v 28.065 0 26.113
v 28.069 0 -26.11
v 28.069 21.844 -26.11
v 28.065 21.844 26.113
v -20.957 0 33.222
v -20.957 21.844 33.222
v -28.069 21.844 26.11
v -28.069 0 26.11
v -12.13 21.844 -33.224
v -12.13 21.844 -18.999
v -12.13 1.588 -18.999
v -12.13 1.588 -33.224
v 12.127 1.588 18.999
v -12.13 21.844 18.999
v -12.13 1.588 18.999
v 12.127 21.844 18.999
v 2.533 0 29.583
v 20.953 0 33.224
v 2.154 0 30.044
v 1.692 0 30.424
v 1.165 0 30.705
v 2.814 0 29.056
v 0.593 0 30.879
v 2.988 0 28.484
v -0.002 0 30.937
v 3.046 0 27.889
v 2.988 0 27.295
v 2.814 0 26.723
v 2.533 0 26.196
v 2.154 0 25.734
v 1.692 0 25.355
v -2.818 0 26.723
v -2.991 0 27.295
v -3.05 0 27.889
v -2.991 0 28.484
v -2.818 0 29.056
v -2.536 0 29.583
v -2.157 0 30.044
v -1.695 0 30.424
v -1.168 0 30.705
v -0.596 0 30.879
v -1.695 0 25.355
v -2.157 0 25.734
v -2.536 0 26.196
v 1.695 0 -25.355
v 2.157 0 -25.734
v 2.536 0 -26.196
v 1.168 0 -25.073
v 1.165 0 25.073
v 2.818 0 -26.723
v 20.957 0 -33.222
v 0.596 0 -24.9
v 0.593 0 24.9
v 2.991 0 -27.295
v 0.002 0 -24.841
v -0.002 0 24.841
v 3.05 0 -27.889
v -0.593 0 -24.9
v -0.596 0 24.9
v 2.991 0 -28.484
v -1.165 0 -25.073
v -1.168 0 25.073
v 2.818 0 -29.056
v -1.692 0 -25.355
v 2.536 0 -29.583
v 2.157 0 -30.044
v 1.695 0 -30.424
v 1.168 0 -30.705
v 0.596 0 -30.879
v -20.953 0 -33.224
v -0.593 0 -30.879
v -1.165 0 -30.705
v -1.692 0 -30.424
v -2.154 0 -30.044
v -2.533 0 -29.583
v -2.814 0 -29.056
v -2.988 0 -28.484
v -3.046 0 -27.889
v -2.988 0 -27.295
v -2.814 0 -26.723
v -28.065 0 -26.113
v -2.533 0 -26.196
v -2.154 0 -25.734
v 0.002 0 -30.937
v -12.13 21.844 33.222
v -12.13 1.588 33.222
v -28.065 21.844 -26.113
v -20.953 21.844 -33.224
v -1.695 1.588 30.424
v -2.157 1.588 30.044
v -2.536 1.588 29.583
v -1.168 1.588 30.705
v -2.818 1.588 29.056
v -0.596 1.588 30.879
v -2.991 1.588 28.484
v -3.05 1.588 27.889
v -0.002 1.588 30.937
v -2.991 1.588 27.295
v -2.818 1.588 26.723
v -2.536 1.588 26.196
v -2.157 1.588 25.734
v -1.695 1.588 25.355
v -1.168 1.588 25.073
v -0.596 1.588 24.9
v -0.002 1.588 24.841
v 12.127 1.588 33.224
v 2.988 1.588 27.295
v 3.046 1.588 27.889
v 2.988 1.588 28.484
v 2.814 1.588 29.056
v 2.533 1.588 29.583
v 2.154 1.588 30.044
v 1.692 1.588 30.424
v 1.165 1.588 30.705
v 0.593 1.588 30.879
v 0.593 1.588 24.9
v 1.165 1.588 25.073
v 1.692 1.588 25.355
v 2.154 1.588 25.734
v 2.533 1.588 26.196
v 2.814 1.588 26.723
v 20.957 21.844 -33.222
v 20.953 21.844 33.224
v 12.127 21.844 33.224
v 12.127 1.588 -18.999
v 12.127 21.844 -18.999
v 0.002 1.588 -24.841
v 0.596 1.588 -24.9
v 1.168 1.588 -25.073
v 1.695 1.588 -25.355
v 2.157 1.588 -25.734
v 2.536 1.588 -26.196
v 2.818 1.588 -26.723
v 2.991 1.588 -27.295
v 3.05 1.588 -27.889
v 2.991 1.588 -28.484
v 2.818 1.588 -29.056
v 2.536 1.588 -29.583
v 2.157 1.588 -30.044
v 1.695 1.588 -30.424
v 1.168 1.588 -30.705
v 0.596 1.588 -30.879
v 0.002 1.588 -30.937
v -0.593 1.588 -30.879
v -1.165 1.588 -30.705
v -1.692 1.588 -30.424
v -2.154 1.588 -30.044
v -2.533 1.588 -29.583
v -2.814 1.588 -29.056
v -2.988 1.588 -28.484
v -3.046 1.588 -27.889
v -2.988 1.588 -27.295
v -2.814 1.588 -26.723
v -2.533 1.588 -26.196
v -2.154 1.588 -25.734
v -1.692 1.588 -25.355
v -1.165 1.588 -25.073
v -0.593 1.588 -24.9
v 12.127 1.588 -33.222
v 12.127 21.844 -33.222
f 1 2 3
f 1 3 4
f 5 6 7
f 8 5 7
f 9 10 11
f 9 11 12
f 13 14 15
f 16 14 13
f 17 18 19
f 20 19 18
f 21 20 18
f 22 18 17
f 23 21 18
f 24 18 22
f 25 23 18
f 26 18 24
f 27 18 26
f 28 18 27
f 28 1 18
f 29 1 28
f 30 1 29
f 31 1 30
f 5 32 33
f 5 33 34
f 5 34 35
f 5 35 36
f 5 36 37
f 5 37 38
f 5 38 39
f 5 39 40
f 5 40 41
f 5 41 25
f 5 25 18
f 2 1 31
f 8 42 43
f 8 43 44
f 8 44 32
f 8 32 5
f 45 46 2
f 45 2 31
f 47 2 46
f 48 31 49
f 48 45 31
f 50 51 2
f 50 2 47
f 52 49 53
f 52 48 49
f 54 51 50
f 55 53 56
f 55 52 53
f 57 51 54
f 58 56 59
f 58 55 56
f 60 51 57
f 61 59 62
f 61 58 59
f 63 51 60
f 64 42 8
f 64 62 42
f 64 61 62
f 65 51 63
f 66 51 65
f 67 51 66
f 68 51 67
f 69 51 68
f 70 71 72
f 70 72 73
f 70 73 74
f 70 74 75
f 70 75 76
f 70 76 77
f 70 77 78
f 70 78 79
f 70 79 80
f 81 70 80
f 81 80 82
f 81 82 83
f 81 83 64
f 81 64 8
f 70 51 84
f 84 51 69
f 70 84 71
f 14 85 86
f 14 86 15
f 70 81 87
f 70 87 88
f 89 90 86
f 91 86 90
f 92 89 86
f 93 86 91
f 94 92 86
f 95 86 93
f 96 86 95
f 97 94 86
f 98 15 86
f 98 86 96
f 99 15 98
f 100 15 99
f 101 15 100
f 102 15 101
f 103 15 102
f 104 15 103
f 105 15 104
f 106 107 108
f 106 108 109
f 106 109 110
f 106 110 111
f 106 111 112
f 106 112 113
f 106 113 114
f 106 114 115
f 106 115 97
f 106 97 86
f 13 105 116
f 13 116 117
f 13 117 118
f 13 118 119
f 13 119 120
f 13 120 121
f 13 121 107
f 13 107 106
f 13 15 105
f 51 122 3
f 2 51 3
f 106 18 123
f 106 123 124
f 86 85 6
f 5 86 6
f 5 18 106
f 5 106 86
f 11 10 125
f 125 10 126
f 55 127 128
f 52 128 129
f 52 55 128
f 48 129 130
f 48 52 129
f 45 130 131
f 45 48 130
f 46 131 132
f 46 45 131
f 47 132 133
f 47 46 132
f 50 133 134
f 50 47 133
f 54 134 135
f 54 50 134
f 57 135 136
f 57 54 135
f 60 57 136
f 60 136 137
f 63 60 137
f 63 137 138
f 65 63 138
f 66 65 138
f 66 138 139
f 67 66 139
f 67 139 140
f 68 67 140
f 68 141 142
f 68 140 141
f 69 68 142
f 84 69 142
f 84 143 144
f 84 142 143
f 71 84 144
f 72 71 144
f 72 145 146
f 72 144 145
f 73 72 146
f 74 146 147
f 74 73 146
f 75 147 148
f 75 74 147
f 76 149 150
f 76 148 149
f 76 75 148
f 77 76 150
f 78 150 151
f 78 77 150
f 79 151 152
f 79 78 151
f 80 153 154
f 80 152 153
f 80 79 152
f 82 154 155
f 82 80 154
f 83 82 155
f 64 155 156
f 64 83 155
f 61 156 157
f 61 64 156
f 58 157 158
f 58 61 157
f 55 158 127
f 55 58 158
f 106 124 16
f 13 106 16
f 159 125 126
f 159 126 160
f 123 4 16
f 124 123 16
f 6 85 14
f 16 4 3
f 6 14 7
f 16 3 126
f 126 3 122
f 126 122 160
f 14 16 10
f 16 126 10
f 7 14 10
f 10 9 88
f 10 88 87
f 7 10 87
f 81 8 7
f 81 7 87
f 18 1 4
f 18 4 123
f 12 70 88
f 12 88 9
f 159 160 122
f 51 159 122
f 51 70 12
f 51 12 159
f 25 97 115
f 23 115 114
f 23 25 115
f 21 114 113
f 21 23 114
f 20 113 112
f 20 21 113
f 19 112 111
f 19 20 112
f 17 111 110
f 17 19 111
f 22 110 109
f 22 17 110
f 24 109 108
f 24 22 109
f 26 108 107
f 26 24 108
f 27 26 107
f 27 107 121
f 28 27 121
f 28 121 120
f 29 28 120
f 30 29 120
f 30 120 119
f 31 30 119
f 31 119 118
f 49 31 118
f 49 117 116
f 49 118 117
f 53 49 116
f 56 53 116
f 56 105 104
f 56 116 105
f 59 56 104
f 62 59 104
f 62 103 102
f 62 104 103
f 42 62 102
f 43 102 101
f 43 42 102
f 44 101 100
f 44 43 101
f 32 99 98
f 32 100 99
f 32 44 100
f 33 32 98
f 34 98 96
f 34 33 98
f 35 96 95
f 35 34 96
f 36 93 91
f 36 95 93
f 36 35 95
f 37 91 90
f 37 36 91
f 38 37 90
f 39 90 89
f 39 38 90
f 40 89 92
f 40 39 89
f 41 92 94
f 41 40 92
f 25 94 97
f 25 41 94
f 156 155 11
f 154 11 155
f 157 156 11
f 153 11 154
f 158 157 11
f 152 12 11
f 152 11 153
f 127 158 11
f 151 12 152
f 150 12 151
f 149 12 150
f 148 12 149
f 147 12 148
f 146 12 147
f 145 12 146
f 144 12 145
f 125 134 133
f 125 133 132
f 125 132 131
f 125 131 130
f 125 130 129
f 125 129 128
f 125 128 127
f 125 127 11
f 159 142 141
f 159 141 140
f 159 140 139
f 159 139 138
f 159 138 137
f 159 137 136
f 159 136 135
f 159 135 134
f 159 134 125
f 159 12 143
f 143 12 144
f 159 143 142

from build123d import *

# Parameters (mm, degrees)
SKETCH1_R           = 3.048
BOSS_EXTRUDE1_DEPTH = 21.844
SKETCH2_W           = 24.257
SKETCH2_H           = 14.478
CUT_EXTRUDE1_DEPTH  = 20.2565


with BuildPart() as part:
    # Sketch1 → Boss-Extrude1 (new body)
    with BuildSketch(Plane(origin=(0, 0, 0), x_dir=(1, 0, 0), z_dir=(0, 1, 0))):
        Polygon((-28.065439725, 26.112877044), (-20.953014773, 33.224452067), (20.956985152, 33.221947814), (28.068560175, 26.109522863), (28.065439725, -26.112877044), (20.953014773, -33.224452067), (-20.956985152, -33.221947814), (-28.068560175, -26.109522863), align=None)
        with Locations(Location((0.001666466, 27.88919995, 0), (0, 0, 270))):
            Circle(SKETCH1_R, mode=Mode.SUBTRACT)
        with Locations(Location((-0.001666466, -27.88919995, 0), (0, 0, 270))):
            Circle(SKETCH1_R, mode=Mode.SUBTRACT)
    extrude(amount=BOSS_EXTRUDE1_DEPTH)

    # Sketch2 → Cut-Extrude1 (cut)
    with BuildSketch(Plane(origin=(0, 21.844, 0), x_dir=(1, 0, 0), z_dir=(0, 1, 0))):
        with Locations((-0.001985189, -26.238199941)):
            Rectangle(SKETCH2_W, SKETCH2_H)
        with Locations((-0.001985189, 26.238168907)):
            Rectangle(SKETCH2_W, SKETCH2_H)
    extrude(amount=-CUT_EXTRUDE1_DEPTH, mode=Mode.SUBTRACT)


solid = part.part
